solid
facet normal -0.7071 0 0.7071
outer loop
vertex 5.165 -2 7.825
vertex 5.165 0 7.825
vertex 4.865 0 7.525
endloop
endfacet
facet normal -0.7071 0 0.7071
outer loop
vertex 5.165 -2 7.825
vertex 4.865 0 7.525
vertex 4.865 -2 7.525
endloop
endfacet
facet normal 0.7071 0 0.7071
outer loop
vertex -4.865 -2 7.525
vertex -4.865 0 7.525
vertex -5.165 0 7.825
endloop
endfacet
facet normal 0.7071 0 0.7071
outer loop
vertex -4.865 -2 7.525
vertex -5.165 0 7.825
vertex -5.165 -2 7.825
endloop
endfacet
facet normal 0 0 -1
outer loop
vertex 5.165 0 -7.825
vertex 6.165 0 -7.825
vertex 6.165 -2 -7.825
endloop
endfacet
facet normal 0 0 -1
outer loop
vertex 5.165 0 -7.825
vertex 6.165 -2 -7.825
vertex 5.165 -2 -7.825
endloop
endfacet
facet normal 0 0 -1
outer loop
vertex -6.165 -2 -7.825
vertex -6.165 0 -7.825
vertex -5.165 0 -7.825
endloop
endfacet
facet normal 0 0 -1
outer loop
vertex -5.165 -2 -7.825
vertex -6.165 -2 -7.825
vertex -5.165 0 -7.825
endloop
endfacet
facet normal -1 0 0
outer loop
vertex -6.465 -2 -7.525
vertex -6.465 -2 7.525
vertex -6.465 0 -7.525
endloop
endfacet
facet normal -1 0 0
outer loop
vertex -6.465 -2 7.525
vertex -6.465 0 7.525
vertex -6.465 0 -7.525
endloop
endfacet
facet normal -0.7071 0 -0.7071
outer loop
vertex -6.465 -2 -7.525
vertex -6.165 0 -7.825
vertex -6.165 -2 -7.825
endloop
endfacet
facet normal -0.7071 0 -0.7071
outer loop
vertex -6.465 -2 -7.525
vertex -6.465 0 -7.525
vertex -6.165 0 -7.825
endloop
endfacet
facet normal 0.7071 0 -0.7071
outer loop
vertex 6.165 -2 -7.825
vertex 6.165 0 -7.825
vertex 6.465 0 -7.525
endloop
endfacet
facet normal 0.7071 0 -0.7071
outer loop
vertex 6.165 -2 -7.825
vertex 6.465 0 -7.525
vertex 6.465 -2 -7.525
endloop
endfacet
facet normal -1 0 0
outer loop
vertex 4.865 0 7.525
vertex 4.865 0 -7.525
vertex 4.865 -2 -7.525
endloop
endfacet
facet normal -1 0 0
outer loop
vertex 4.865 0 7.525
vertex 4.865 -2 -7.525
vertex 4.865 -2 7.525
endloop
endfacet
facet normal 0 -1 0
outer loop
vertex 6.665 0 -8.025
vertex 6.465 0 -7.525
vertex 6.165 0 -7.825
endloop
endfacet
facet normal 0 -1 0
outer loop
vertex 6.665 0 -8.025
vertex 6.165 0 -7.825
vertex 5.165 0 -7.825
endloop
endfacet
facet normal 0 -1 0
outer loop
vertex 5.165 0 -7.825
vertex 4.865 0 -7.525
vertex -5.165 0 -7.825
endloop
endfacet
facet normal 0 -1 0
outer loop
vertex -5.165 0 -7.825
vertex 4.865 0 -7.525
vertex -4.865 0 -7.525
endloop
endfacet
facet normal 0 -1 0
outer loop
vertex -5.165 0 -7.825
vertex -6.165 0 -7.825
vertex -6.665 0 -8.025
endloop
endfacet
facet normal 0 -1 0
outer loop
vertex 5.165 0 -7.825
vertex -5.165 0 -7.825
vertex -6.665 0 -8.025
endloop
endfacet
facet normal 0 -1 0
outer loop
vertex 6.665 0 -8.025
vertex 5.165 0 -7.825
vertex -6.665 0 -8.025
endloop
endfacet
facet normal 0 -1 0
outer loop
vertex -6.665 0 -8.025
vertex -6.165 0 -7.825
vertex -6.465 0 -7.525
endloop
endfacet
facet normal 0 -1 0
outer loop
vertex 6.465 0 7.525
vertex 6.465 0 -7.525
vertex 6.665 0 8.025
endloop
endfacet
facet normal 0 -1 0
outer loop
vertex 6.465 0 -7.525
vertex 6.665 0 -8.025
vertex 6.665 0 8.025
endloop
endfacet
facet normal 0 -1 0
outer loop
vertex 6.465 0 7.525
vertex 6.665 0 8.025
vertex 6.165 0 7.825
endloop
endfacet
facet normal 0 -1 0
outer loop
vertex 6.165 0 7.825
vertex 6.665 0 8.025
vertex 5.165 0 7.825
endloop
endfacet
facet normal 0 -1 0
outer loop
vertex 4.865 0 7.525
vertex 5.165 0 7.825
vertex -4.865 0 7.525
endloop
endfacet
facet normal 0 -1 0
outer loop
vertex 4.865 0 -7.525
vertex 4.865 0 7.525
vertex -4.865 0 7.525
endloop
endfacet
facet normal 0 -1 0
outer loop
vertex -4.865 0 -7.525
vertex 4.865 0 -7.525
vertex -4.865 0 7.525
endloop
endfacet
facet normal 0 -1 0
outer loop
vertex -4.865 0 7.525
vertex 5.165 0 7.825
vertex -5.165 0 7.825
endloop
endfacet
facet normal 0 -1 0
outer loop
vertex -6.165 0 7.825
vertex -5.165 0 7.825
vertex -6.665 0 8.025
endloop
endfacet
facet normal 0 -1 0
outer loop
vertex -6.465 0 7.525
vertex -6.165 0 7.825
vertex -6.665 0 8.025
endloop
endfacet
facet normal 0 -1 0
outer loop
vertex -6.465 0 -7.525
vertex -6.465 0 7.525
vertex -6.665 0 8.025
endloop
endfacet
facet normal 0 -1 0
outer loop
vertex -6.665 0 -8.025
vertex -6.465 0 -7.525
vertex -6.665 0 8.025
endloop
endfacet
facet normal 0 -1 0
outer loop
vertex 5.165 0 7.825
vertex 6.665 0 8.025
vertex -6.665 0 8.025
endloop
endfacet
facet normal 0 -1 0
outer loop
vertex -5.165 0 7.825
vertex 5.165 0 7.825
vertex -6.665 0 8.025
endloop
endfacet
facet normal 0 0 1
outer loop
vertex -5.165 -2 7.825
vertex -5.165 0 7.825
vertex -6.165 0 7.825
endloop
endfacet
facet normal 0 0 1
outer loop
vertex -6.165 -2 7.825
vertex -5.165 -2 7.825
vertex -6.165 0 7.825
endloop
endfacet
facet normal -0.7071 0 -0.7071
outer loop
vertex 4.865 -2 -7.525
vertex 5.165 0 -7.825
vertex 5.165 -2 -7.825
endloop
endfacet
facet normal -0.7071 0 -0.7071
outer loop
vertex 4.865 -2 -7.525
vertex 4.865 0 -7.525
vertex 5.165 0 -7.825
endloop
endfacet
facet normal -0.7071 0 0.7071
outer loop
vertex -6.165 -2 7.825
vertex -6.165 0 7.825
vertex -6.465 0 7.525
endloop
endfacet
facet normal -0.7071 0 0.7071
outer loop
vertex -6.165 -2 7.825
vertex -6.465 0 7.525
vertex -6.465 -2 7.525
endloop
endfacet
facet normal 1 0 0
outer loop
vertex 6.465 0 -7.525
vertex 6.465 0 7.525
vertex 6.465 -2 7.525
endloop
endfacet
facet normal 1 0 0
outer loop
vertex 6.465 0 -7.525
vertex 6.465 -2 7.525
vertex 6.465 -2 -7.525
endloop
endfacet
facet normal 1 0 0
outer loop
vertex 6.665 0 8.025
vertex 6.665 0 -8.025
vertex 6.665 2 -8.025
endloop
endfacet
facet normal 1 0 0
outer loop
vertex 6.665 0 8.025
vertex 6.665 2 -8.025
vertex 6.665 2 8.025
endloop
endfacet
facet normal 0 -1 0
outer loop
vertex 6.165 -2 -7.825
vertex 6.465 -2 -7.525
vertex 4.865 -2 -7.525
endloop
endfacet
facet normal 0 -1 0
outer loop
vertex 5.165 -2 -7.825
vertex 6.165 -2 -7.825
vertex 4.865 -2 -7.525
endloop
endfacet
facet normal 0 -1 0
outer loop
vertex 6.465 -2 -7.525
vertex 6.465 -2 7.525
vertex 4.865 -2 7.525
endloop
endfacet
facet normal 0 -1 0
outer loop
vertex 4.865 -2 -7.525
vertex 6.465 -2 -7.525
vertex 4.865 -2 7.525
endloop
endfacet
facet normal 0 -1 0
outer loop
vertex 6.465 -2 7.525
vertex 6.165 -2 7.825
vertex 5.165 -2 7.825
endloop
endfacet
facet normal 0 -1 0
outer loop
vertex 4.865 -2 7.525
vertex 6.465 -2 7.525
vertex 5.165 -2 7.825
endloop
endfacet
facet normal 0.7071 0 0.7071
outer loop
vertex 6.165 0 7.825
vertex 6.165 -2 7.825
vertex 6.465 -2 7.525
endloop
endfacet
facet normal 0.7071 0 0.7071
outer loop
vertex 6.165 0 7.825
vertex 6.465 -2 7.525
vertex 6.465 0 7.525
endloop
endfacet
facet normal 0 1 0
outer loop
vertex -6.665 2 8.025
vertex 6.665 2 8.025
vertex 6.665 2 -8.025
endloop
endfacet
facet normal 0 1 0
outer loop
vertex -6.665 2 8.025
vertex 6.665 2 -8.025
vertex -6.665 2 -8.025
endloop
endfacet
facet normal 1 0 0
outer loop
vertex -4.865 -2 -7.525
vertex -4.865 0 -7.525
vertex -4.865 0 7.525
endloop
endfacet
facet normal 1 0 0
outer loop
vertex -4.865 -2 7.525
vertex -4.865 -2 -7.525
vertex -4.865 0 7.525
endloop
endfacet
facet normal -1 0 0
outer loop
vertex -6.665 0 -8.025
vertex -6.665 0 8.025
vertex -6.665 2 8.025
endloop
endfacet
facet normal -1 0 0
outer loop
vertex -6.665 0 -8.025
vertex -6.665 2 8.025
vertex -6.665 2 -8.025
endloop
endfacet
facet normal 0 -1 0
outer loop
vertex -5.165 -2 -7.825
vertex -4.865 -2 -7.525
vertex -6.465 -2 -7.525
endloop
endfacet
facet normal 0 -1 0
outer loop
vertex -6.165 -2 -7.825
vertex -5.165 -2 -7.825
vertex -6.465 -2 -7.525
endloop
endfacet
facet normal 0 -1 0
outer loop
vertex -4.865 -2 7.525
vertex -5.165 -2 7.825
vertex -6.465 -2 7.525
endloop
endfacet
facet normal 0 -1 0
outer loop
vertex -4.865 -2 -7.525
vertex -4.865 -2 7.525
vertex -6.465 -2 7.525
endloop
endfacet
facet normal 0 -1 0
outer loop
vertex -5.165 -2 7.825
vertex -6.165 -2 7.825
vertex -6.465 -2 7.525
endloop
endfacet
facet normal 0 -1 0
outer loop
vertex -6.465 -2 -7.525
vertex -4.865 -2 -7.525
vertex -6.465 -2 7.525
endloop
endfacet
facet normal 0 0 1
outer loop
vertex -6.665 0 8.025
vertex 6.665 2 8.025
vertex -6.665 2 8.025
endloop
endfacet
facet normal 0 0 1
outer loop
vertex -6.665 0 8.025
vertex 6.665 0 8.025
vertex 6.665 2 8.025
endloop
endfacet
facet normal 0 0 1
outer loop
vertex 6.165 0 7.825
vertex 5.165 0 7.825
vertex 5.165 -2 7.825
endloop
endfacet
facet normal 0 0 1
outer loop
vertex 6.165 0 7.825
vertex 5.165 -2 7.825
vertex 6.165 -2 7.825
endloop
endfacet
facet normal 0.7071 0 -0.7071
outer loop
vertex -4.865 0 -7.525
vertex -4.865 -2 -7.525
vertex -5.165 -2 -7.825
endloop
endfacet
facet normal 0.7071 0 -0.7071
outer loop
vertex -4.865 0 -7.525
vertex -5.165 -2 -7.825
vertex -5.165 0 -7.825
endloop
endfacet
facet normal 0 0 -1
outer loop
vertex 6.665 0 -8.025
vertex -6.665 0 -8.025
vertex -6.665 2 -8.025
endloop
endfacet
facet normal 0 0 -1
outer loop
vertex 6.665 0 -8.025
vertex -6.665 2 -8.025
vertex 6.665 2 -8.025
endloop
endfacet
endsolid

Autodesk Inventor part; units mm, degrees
ref_plane "YZ Plane" through (0, 0, 0) normal (1, 0, 0) x (0, 1, 0)
ref_plane "XZ Plane" through (0, 0, 0) normal (0, 1, 0) x (-1, 0, 0)
ref_plane "XY Plane" through (0, 0, 0) normal (0, 0, 1) x (1, 0, 0)
sketch "Sketch1" plane through (0, 0, 0) normal (0, 1, 0) x (-1, 0, 0)
  line L0 (-6.665, 8.025) -> (6.665, 8.025)
  line L1 (6.665, 8.025) -> (6.665, -8.025)
  line L2 (6.665, -8.025) -> (-6.665, -8.025)
  line L3 (-6.665, -8.025) -> (-6.665, 8.025)
  line L4 (-6.665, 8.025) -> (6.665, -8.025) construction
  line L5 (6.665, 8.025) -> (-6.665, -8.025) construction
  line L6 (0, -11.235) -> (0, 11.235) projected
  line L7 (6.665, 8.025) -> (4.665, 8.025)
  line L8 (4.665, 8.025) -> (4.665, -8.025)
  line L9 (4.665, -8.025) -> (6.665, -8.025)
  line L10 (6.665, -8.025) -> (6.665, 8.025)
  line L11 (-6.665, -8.025) -> (-4.665, -8.025)
  line L12 (-4.665, -8.025) -> (-4.665, 8.025)
  line L13 (-4.665, 8.025) -> (-6.665, 8.025)
  line L14 (-6.665, 8.025) -> (-6.665, -8.025)
  line L15 (4.865, -7.825) -> (4.865, 7.825)
  line L16 (4.865, 7.825) -> (6.465, 7.825)
  line L17 (6.465, 7.825) -> (6.465, -7.825)
  line L18 (6.465, -7.825) -> (4.865, -7.825)
  line L19 (-6.465, -7.825) -> (-4.865, -7.825)
  line L20 (-4.865, -7.825) -> (-4.865, 7.825)
  line L21 (-4.865, 7.825) -> (-6.465, 7.825)
  line L22 (-6.465, 7.825) -> (-6.465, -7.825)
  point P0 (0, 0)
  dimension "d0" = 16.05
  dimension "d1" = 13.33
  dimension "d7" = 2
  dimension "d8" = 0.2
  dimension "d9" = 0.2
extrude "Extrusion1" add sketch "Sketch1" along normal blind 2 contours L0 L12 L2 L3 | L0 L6 L2 L12 | L0 L8 L2 L6 | L0 L1 L2 L8 | L15 L16 L17 L18 | L22 L21 L20 L19
extrude "Extrusion2" add sketch "Sketch1" against normal blind 2 contours L15 L16 L17 L18 | L22 L21 L20 L19
chamfer "Chamfer1" distance 0.3 angle 45 8 edges at (-4.865, -1, 7.825) (-6.465, -1, 7.825) (4.865, -1, 7.825) (6.465, -1, 7.825) (4.865, -1, -7.825) (6.465, -1, -7.825) (-4.865, -1, -7.825) (-6.465, -1, -7.825)
properties part number "Logic_Level_Shifter"
